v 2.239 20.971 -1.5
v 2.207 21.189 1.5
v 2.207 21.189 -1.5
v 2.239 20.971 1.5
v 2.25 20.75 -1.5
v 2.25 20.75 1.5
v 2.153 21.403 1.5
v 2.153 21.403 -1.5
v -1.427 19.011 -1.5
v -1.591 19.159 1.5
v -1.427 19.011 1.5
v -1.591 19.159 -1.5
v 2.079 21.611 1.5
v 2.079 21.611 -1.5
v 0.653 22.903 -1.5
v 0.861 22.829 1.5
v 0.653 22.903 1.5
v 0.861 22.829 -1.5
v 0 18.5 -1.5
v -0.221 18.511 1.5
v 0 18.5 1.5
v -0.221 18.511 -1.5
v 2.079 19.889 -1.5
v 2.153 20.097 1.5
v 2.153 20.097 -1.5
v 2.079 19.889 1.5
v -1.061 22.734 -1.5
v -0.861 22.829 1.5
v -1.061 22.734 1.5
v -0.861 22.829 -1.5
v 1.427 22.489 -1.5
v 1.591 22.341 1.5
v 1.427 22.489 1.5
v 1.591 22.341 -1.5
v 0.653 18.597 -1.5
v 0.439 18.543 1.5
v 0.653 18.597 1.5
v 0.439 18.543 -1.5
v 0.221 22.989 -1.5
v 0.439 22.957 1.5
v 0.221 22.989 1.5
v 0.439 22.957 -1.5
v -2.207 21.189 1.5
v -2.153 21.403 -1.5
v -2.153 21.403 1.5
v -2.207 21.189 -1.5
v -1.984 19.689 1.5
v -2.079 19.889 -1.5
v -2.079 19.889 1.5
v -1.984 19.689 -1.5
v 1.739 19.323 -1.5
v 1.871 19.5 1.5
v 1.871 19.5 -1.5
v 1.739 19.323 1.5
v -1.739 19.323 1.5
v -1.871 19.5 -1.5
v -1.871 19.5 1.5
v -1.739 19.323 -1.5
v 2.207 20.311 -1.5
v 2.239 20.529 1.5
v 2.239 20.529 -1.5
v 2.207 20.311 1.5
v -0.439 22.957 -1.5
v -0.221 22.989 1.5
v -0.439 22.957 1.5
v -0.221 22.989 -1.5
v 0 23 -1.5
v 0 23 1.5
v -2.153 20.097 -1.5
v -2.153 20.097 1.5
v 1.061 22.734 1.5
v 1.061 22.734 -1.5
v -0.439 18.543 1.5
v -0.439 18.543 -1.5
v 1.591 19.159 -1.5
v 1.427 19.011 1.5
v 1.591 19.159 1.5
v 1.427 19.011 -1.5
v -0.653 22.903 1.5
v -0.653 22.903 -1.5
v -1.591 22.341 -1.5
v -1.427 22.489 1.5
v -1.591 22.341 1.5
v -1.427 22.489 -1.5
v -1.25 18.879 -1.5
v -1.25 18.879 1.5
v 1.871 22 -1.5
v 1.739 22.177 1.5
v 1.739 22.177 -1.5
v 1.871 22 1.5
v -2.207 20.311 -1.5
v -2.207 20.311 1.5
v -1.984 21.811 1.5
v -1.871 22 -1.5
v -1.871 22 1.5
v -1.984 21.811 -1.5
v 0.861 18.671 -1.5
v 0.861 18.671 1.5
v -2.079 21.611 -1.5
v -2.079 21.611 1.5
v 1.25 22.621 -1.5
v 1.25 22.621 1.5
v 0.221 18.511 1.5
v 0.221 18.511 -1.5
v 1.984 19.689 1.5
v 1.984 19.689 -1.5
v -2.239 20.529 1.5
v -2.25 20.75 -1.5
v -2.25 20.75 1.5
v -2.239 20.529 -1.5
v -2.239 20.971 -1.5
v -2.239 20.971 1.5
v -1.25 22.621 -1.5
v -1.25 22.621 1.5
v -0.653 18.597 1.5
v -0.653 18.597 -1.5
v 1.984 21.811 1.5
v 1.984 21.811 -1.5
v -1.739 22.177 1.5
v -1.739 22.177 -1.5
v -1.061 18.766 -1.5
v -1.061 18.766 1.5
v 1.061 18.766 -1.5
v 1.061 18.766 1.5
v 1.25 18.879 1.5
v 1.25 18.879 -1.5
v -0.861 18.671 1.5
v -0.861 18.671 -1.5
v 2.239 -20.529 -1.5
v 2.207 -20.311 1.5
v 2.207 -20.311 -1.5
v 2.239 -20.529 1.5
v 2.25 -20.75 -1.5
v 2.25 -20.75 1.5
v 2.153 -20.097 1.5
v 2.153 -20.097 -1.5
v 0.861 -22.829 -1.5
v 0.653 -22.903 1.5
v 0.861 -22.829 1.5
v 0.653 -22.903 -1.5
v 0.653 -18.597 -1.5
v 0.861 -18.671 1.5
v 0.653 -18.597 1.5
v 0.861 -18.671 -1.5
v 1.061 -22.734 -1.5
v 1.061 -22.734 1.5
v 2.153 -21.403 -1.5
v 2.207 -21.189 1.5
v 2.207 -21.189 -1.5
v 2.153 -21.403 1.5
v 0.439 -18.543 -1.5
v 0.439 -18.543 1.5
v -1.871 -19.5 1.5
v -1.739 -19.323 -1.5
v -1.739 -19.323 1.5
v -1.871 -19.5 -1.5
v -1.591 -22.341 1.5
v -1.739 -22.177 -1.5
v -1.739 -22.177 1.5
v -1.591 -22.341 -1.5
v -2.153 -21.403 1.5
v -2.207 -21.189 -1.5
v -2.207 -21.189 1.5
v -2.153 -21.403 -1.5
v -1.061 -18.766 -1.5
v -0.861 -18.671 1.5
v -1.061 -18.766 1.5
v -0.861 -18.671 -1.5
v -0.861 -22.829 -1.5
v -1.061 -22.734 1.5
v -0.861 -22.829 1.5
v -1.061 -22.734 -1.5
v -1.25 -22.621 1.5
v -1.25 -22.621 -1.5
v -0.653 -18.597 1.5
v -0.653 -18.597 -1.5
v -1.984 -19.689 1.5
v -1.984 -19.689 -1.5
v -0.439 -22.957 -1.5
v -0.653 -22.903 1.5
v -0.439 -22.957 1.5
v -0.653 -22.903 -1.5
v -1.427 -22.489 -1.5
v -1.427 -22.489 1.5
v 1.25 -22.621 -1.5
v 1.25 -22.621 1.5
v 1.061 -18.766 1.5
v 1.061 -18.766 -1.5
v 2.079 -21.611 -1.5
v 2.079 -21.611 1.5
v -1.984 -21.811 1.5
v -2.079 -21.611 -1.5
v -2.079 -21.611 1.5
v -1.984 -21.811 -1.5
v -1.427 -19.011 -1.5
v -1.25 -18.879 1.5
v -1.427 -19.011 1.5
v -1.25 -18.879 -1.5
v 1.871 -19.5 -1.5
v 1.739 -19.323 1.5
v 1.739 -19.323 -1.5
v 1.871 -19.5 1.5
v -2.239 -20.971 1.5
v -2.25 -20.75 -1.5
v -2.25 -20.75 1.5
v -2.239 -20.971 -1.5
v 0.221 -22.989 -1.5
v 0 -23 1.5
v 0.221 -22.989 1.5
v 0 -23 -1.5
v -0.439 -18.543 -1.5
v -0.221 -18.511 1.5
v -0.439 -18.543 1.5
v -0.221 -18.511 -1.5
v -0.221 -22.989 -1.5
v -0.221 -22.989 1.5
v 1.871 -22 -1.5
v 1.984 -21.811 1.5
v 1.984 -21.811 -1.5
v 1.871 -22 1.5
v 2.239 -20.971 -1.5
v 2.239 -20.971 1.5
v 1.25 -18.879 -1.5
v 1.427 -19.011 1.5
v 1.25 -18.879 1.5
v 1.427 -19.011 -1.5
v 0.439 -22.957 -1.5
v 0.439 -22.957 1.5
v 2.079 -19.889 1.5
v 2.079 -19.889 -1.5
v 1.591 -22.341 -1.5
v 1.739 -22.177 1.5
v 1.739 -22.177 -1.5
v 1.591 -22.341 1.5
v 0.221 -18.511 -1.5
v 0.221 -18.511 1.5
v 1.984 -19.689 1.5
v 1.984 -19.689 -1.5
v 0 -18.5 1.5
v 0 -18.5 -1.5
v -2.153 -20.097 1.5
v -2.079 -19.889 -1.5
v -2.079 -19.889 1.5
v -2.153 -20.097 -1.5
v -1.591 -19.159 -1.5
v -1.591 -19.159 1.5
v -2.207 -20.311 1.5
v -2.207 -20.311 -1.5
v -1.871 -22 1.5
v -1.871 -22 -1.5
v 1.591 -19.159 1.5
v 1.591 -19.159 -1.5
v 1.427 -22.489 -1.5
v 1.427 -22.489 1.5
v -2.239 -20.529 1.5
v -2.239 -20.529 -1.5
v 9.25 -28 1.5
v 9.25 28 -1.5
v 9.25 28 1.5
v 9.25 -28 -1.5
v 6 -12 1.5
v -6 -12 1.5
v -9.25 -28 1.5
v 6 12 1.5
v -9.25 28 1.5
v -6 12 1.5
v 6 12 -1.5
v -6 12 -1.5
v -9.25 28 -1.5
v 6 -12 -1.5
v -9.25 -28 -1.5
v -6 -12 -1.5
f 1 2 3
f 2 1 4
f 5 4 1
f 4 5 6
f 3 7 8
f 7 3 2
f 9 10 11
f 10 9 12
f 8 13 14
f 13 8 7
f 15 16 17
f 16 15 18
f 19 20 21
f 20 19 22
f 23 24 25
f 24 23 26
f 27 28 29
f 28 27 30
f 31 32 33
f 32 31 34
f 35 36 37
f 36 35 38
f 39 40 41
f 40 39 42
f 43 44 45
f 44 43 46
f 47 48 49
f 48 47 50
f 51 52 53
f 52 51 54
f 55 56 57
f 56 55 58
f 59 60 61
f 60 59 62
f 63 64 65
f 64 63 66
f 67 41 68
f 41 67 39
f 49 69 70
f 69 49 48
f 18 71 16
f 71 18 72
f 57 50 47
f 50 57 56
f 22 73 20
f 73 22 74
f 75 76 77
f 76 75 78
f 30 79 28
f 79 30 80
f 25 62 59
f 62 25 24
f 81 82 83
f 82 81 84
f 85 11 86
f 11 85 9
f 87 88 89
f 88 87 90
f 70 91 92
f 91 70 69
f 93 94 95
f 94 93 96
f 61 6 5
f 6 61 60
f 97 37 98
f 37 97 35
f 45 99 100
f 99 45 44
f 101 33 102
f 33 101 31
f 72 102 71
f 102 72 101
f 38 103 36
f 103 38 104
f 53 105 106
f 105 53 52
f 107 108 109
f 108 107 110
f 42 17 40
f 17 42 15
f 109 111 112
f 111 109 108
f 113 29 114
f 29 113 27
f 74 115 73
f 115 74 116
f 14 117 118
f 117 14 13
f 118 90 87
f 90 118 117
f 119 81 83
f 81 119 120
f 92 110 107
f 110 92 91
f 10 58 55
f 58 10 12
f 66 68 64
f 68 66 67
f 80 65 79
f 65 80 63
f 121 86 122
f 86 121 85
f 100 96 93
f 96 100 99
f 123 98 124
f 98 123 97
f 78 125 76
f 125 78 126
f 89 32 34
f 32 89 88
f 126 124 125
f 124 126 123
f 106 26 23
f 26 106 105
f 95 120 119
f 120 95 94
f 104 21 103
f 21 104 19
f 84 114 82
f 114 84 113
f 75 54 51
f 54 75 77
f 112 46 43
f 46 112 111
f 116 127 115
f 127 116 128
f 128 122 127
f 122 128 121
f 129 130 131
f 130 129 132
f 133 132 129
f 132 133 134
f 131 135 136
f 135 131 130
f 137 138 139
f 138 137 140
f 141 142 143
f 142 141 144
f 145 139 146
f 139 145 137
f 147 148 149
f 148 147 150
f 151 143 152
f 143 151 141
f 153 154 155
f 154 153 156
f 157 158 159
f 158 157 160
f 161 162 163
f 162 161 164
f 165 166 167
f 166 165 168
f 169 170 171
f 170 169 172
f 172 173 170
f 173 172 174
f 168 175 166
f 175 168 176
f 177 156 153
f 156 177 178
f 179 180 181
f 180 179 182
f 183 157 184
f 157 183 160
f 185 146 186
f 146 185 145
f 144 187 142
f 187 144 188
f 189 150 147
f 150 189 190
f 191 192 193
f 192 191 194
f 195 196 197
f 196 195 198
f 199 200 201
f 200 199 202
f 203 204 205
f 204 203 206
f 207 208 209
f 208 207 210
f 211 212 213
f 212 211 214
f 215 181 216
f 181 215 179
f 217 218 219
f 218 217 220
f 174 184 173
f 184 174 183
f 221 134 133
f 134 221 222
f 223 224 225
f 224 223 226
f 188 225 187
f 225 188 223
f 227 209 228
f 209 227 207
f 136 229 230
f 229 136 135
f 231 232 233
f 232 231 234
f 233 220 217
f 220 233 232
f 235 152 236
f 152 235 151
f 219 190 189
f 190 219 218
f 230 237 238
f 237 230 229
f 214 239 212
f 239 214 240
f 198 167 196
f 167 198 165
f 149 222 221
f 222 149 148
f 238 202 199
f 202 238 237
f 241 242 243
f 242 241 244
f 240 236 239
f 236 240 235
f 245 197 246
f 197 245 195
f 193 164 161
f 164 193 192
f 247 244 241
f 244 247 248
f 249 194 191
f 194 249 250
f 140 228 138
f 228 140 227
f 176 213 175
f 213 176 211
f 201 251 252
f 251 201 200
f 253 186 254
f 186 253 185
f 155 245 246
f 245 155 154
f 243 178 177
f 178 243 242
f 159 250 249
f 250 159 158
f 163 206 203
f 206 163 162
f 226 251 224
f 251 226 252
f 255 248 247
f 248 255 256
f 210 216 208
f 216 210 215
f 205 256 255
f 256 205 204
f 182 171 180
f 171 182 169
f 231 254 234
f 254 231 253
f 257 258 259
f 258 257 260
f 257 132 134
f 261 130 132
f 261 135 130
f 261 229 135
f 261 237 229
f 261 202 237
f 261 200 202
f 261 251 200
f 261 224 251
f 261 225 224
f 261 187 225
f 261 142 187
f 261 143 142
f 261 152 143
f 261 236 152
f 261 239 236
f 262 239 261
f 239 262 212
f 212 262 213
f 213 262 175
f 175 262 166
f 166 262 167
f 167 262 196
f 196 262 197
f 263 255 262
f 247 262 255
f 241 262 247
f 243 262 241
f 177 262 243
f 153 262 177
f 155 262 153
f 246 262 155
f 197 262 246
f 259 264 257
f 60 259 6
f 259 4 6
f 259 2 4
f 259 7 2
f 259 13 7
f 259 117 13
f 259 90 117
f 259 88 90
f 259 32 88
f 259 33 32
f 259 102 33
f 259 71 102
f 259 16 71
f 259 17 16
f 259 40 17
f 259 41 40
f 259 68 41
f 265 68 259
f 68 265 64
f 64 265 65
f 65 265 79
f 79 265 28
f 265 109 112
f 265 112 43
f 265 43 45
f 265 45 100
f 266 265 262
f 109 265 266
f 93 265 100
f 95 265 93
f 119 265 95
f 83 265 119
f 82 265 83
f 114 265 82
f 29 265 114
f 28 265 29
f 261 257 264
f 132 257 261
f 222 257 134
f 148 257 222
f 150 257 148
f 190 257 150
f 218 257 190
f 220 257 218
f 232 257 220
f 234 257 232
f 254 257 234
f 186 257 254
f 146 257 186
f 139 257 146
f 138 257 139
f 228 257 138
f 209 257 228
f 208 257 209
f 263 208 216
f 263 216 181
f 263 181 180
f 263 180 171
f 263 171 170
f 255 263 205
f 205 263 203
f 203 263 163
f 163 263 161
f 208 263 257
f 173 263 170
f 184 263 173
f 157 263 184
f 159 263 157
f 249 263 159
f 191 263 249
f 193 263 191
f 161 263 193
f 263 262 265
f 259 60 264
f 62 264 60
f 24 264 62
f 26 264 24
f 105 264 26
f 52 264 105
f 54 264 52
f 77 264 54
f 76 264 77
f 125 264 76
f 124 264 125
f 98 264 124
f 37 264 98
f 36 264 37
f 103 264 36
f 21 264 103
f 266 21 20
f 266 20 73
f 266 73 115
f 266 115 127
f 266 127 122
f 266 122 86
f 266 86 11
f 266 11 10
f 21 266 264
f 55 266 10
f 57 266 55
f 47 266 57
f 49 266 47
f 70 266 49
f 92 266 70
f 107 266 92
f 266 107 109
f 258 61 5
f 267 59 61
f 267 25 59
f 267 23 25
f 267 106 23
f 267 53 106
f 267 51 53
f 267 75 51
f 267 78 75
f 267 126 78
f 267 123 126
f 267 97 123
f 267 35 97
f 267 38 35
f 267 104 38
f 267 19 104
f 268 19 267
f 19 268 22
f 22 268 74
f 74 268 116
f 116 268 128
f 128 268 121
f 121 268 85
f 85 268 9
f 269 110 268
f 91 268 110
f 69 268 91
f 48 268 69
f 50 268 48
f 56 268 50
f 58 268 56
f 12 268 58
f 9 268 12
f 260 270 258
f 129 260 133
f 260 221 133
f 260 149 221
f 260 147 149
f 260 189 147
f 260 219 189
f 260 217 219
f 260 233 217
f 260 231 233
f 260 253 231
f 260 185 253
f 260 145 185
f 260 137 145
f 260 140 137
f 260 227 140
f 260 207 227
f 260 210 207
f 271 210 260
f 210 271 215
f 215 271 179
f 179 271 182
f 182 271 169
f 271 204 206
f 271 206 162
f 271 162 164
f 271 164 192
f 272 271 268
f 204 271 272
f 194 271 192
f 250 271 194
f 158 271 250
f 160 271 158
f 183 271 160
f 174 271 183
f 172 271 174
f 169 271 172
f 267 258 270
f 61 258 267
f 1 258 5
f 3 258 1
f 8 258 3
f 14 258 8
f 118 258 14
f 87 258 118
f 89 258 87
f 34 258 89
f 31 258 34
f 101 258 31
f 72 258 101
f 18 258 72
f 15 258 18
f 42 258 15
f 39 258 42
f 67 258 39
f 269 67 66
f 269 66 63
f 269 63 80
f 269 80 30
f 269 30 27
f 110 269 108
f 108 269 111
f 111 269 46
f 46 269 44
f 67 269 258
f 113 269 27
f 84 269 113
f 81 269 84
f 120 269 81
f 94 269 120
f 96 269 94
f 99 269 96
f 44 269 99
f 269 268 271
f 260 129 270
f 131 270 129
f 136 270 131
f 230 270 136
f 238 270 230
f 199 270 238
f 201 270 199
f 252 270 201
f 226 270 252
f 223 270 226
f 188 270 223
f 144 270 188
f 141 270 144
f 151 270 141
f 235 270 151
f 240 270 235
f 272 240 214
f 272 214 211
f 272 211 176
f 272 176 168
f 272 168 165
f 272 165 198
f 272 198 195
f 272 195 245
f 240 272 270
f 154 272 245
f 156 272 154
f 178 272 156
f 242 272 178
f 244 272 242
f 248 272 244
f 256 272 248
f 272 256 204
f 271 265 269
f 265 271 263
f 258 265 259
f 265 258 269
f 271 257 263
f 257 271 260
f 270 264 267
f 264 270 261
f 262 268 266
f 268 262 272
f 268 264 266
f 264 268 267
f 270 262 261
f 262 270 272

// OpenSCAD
//Overall Thickness
thickness = 3; //[0.1:0.1:30]

//Outer Rectangle - Width
hull_x = 18.5; //[0.5:0.1:300]
//Outer Rectangle - Length
hull_y = 56; //[0.5:0.1:300]

//Inner Rectangle (Cut) - Width
in_x = 12; //[0.5:0.1:299]
//Inner Rectangle (Cut) - Length
in_y = 24; //[0.5:0.1:299]

//Screw Diameter
screw_dia = 4.5; //[0.5:0.1:100]
//Overall Seperation
screw_seperation = 41.5; //[0.5:0.1:280]

//Final Representation
outer_hull();


module outer_hull(){
    difference(){
        cube([hull_x, hull_y, thickness], center = true);
        cube([in_x, in_y, thickness + 1], center = true);
        placed_screws();
    }
}


module placed_screws(){
    translate([0,screw_seperation/2, 0]){
        screw_holes();
    }
    translate([0,-screw_seperation/2, 0]){
        screw_holes();
    }
}

module screw_holes(){
    cylinder(h = thickness + 1, d = screw_dia, center = true, $fn = 64);
}
